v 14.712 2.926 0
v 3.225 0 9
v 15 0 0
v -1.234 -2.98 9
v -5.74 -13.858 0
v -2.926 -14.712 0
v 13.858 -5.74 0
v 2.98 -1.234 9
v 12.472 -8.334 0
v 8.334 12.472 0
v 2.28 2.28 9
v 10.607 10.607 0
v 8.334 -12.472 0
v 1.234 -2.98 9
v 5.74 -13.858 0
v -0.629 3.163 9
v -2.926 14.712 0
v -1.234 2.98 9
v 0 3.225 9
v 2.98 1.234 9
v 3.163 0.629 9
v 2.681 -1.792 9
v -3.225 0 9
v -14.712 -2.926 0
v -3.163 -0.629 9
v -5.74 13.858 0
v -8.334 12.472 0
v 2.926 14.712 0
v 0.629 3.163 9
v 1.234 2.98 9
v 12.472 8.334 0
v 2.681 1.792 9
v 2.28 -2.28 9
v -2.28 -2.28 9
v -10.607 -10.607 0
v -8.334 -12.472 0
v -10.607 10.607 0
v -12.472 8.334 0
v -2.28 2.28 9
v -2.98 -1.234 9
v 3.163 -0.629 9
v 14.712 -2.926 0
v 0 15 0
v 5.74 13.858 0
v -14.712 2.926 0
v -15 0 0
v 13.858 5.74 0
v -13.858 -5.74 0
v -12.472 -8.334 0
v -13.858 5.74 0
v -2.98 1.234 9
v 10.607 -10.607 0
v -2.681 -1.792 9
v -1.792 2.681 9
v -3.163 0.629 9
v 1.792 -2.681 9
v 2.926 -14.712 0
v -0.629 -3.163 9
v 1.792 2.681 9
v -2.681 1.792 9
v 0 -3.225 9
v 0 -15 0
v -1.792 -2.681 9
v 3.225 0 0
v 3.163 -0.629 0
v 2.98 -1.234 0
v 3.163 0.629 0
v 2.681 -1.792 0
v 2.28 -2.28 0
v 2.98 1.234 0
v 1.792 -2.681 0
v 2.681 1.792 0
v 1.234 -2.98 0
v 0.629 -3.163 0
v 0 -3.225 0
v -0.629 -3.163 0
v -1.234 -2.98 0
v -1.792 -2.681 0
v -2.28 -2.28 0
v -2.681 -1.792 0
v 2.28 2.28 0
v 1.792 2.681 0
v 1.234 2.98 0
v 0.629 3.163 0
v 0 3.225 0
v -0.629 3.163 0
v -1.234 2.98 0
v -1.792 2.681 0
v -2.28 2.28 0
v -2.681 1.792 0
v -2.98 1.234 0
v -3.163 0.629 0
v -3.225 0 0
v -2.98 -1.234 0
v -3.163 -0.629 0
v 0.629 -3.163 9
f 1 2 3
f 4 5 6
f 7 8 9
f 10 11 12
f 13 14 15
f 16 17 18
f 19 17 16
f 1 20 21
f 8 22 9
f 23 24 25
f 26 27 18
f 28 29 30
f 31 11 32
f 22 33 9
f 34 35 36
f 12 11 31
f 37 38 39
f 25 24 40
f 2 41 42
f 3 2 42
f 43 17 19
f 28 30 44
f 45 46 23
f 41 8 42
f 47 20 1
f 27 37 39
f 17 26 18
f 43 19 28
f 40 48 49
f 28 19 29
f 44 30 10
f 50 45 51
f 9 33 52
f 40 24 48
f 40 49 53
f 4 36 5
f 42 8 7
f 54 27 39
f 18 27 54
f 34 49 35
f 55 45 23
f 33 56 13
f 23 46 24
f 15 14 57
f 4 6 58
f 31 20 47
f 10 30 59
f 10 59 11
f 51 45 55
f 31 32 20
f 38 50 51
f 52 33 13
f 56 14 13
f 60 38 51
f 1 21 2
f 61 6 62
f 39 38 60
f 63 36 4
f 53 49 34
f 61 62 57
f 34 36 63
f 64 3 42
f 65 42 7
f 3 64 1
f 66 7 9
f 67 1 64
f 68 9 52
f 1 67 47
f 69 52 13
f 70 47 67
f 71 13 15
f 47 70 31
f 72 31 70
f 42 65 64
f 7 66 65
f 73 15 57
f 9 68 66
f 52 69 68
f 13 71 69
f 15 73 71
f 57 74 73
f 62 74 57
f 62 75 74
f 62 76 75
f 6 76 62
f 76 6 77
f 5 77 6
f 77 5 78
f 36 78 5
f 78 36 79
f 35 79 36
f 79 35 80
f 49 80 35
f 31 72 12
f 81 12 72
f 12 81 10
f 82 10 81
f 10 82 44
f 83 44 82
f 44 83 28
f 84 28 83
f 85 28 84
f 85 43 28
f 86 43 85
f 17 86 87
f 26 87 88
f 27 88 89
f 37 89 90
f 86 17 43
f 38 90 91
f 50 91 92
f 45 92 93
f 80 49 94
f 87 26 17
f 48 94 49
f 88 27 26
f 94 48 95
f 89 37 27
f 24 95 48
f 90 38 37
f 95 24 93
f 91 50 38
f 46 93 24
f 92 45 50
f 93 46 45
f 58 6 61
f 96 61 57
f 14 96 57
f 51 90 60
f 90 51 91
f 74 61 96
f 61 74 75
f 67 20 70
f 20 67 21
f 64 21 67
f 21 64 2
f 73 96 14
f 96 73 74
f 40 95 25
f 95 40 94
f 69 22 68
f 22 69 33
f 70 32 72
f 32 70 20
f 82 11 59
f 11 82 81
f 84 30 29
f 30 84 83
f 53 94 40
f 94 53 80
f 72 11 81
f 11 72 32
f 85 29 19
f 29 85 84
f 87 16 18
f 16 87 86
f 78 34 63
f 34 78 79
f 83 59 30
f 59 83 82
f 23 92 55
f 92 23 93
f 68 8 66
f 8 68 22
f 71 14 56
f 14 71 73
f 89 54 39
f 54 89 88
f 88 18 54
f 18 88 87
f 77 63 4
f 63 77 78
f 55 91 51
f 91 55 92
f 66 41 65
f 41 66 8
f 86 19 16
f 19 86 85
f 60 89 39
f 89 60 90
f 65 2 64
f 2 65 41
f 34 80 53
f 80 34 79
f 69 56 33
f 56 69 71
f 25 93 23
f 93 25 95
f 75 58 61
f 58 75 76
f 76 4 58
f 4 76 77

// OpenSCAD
/* Remixed from:
Ball Bearing Spool Holder for Monoprice Select Mini (Malyan M200) byandymandiasis licensed under theCreative Commons - Attributionlicense.
By downloading this thing, you agree to abide by the license: Creative Commons - Attribution - Non-Commercial - No Derivatives
https://www.thingiverse.com/thing:2095432/files
*/

part = 1; // 0:Holder, 1:Cone, 2:Spacer
inch = 25.4;
carriageBolt = true;
boltHeadTolerance = 0.2;
boltShaftTolerance = 0.05;
boltShaftDiameter = 0.25*inch;
boltHexHeadDiameter = 0.505*inch;
boltHexHeadHeight = 0.163*inch;
boltCarriageHeadDiameter = 0.547*inch;
boltCarriageHeadHeight = 0.15*inch;
boltCarriageSquareSide = 0.26*inch;
boltCarriageSquareHeight = 0.136*inch;
boltOffsetFromFastener = 4;
fastenerHeight = 20;
fastenerExtraWidth = .9;
fastenerThinner = .15;
extraHeight = 19;
coneWidth = 30;
coneLength = 9;

nudge = 0.001;

$fn = 32;

miniCrossSection0 = [ [-7.5,-15],[7.5,-15],[7.5,15],[-7.5,15],[-7.5,12+fastenerExtraWidth],[-5,12+fastenerExtraWidth],[-4,11+fastenerExtraWidth],[-4,5.5],[-6-fastenerThinner,5.5],[-6-fastenerThinner,8],[-7,9],[-7.5,9],[-7.5,-9],[-7,-9],[-6-fastenerThinner,-8],[-6-fastenerThinner,-5.5],[-4,-5.5],[-4,-11-fastenerExtraWidth],[-5,-12-fastenerExtraWidth],[-7.5,-12-fastenerExtraWidth],[-7.5,-15] ];
xMin = min([for (xy=miniCrossSection0) xy[0]]);
thickness = abs(xMin)*2;
miniCrossSection = [for (xy=miniCrossSection0) [xy[0]-xMin,xy[1]]];

module boltHole() {
    if (carriageBolt) {
        cylinder(h=boltCarriageHeadHeight+boltHeadTolerance,d=boltCarriageHeadDiameter+2*boltHeadTolerance);
        cylinder(h=boltCarriageSquareHeight+boltCarriageHeadHeight+boltHeadTolerance*2,d=boltCarriageSquareSide*sqrt(2),$fn=4);
    }
    else {
        cylinder(h=boltHexHeadHeight+boltHeadTolerance,d=boltHexHeadDiameter+2*boltHeadTolerance,$fn=6);
    }
    linear_extrude(height=50) circle(d=boltShaftDiameter+2*boltShaftTolerance,$fn=32);
}

module cone() {
    cylinder(d1=coneWidth,d2=boltShaftDiameter+2*boltShaftTolerance,h=coneLength,$fn=32);
}

module main() {
    difference() {
        union() {
            linear_extrude(height=fastenerHeight) polygon(miniCrossSection);
            translate([0,0,fastenerHeight-nudge]) linear_extrude(height=extraHeight) hull() polygon(miniCrossSection);
            translate([thickness,0,fastenerHeight+boltOffsetFromFastener]) rotate([0,90,0]) translate([0,0,-nudge]) cone();
        }
        translate([0,0,fastenerHeight+boltOffsetFromFastener]) rotate([0,90,0]) translate([0,0,-nudge]) boltHole();
    }
}

if (part==0) 
    rotate([180,0,0]) main();
else if (part == 1) {
    difference() {
        cone();
        cylinder(d=boltShaftDiameter+2*boltShaftTolerance,h=100,center=true,$fn=32);
    }
}
else if (part == 2) {
    linear_extrude(height=12) 
        difference() {
            circle(d=boltShaftDiameter+0.75+1.5);
            circle(d=boltShaftDiameter+0.75);
        }
}
//            linear_extrude(height=8) polygon(miniCrossSection);
